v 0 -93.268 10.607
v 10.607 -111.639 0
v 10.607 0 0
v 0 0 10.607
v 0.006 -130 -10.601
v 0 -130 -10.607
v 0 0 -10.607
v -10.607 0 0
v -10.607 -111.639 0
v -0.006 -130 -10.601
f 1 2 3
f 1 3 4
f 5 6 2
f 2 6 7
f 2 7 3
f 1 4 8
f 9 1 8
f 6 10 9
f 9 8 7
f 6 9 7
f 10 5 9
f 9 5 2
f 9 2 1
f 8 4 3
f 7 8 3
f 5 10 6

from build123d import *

# Parameters (mm, degrees)
F1_DEPTH = 130
F3_DEPTH = 12.5


with BuildPart() as f1:
    # F0 (on Front) → F1 (new body)
    with BuildSketch(Plane.XZ):
        Polygon((0, 10.606602), (-10.606602, 0), (0, -10.606602), (10.606602, 0), align=None)
    extrude(amount=F1_DEPTH)

    # F2 (on Right) → F3 (cut, symmetric)
    with BuildSketch(Plane.YZ):
        Polygon((-130, 10.815689), (-130, -10.600555), (-92.905977, 10.815689), align=None)
    extrude(amount=F3_DEPTH, both=True, mode=Mode.SUBTRACT)


solid = f1.part
